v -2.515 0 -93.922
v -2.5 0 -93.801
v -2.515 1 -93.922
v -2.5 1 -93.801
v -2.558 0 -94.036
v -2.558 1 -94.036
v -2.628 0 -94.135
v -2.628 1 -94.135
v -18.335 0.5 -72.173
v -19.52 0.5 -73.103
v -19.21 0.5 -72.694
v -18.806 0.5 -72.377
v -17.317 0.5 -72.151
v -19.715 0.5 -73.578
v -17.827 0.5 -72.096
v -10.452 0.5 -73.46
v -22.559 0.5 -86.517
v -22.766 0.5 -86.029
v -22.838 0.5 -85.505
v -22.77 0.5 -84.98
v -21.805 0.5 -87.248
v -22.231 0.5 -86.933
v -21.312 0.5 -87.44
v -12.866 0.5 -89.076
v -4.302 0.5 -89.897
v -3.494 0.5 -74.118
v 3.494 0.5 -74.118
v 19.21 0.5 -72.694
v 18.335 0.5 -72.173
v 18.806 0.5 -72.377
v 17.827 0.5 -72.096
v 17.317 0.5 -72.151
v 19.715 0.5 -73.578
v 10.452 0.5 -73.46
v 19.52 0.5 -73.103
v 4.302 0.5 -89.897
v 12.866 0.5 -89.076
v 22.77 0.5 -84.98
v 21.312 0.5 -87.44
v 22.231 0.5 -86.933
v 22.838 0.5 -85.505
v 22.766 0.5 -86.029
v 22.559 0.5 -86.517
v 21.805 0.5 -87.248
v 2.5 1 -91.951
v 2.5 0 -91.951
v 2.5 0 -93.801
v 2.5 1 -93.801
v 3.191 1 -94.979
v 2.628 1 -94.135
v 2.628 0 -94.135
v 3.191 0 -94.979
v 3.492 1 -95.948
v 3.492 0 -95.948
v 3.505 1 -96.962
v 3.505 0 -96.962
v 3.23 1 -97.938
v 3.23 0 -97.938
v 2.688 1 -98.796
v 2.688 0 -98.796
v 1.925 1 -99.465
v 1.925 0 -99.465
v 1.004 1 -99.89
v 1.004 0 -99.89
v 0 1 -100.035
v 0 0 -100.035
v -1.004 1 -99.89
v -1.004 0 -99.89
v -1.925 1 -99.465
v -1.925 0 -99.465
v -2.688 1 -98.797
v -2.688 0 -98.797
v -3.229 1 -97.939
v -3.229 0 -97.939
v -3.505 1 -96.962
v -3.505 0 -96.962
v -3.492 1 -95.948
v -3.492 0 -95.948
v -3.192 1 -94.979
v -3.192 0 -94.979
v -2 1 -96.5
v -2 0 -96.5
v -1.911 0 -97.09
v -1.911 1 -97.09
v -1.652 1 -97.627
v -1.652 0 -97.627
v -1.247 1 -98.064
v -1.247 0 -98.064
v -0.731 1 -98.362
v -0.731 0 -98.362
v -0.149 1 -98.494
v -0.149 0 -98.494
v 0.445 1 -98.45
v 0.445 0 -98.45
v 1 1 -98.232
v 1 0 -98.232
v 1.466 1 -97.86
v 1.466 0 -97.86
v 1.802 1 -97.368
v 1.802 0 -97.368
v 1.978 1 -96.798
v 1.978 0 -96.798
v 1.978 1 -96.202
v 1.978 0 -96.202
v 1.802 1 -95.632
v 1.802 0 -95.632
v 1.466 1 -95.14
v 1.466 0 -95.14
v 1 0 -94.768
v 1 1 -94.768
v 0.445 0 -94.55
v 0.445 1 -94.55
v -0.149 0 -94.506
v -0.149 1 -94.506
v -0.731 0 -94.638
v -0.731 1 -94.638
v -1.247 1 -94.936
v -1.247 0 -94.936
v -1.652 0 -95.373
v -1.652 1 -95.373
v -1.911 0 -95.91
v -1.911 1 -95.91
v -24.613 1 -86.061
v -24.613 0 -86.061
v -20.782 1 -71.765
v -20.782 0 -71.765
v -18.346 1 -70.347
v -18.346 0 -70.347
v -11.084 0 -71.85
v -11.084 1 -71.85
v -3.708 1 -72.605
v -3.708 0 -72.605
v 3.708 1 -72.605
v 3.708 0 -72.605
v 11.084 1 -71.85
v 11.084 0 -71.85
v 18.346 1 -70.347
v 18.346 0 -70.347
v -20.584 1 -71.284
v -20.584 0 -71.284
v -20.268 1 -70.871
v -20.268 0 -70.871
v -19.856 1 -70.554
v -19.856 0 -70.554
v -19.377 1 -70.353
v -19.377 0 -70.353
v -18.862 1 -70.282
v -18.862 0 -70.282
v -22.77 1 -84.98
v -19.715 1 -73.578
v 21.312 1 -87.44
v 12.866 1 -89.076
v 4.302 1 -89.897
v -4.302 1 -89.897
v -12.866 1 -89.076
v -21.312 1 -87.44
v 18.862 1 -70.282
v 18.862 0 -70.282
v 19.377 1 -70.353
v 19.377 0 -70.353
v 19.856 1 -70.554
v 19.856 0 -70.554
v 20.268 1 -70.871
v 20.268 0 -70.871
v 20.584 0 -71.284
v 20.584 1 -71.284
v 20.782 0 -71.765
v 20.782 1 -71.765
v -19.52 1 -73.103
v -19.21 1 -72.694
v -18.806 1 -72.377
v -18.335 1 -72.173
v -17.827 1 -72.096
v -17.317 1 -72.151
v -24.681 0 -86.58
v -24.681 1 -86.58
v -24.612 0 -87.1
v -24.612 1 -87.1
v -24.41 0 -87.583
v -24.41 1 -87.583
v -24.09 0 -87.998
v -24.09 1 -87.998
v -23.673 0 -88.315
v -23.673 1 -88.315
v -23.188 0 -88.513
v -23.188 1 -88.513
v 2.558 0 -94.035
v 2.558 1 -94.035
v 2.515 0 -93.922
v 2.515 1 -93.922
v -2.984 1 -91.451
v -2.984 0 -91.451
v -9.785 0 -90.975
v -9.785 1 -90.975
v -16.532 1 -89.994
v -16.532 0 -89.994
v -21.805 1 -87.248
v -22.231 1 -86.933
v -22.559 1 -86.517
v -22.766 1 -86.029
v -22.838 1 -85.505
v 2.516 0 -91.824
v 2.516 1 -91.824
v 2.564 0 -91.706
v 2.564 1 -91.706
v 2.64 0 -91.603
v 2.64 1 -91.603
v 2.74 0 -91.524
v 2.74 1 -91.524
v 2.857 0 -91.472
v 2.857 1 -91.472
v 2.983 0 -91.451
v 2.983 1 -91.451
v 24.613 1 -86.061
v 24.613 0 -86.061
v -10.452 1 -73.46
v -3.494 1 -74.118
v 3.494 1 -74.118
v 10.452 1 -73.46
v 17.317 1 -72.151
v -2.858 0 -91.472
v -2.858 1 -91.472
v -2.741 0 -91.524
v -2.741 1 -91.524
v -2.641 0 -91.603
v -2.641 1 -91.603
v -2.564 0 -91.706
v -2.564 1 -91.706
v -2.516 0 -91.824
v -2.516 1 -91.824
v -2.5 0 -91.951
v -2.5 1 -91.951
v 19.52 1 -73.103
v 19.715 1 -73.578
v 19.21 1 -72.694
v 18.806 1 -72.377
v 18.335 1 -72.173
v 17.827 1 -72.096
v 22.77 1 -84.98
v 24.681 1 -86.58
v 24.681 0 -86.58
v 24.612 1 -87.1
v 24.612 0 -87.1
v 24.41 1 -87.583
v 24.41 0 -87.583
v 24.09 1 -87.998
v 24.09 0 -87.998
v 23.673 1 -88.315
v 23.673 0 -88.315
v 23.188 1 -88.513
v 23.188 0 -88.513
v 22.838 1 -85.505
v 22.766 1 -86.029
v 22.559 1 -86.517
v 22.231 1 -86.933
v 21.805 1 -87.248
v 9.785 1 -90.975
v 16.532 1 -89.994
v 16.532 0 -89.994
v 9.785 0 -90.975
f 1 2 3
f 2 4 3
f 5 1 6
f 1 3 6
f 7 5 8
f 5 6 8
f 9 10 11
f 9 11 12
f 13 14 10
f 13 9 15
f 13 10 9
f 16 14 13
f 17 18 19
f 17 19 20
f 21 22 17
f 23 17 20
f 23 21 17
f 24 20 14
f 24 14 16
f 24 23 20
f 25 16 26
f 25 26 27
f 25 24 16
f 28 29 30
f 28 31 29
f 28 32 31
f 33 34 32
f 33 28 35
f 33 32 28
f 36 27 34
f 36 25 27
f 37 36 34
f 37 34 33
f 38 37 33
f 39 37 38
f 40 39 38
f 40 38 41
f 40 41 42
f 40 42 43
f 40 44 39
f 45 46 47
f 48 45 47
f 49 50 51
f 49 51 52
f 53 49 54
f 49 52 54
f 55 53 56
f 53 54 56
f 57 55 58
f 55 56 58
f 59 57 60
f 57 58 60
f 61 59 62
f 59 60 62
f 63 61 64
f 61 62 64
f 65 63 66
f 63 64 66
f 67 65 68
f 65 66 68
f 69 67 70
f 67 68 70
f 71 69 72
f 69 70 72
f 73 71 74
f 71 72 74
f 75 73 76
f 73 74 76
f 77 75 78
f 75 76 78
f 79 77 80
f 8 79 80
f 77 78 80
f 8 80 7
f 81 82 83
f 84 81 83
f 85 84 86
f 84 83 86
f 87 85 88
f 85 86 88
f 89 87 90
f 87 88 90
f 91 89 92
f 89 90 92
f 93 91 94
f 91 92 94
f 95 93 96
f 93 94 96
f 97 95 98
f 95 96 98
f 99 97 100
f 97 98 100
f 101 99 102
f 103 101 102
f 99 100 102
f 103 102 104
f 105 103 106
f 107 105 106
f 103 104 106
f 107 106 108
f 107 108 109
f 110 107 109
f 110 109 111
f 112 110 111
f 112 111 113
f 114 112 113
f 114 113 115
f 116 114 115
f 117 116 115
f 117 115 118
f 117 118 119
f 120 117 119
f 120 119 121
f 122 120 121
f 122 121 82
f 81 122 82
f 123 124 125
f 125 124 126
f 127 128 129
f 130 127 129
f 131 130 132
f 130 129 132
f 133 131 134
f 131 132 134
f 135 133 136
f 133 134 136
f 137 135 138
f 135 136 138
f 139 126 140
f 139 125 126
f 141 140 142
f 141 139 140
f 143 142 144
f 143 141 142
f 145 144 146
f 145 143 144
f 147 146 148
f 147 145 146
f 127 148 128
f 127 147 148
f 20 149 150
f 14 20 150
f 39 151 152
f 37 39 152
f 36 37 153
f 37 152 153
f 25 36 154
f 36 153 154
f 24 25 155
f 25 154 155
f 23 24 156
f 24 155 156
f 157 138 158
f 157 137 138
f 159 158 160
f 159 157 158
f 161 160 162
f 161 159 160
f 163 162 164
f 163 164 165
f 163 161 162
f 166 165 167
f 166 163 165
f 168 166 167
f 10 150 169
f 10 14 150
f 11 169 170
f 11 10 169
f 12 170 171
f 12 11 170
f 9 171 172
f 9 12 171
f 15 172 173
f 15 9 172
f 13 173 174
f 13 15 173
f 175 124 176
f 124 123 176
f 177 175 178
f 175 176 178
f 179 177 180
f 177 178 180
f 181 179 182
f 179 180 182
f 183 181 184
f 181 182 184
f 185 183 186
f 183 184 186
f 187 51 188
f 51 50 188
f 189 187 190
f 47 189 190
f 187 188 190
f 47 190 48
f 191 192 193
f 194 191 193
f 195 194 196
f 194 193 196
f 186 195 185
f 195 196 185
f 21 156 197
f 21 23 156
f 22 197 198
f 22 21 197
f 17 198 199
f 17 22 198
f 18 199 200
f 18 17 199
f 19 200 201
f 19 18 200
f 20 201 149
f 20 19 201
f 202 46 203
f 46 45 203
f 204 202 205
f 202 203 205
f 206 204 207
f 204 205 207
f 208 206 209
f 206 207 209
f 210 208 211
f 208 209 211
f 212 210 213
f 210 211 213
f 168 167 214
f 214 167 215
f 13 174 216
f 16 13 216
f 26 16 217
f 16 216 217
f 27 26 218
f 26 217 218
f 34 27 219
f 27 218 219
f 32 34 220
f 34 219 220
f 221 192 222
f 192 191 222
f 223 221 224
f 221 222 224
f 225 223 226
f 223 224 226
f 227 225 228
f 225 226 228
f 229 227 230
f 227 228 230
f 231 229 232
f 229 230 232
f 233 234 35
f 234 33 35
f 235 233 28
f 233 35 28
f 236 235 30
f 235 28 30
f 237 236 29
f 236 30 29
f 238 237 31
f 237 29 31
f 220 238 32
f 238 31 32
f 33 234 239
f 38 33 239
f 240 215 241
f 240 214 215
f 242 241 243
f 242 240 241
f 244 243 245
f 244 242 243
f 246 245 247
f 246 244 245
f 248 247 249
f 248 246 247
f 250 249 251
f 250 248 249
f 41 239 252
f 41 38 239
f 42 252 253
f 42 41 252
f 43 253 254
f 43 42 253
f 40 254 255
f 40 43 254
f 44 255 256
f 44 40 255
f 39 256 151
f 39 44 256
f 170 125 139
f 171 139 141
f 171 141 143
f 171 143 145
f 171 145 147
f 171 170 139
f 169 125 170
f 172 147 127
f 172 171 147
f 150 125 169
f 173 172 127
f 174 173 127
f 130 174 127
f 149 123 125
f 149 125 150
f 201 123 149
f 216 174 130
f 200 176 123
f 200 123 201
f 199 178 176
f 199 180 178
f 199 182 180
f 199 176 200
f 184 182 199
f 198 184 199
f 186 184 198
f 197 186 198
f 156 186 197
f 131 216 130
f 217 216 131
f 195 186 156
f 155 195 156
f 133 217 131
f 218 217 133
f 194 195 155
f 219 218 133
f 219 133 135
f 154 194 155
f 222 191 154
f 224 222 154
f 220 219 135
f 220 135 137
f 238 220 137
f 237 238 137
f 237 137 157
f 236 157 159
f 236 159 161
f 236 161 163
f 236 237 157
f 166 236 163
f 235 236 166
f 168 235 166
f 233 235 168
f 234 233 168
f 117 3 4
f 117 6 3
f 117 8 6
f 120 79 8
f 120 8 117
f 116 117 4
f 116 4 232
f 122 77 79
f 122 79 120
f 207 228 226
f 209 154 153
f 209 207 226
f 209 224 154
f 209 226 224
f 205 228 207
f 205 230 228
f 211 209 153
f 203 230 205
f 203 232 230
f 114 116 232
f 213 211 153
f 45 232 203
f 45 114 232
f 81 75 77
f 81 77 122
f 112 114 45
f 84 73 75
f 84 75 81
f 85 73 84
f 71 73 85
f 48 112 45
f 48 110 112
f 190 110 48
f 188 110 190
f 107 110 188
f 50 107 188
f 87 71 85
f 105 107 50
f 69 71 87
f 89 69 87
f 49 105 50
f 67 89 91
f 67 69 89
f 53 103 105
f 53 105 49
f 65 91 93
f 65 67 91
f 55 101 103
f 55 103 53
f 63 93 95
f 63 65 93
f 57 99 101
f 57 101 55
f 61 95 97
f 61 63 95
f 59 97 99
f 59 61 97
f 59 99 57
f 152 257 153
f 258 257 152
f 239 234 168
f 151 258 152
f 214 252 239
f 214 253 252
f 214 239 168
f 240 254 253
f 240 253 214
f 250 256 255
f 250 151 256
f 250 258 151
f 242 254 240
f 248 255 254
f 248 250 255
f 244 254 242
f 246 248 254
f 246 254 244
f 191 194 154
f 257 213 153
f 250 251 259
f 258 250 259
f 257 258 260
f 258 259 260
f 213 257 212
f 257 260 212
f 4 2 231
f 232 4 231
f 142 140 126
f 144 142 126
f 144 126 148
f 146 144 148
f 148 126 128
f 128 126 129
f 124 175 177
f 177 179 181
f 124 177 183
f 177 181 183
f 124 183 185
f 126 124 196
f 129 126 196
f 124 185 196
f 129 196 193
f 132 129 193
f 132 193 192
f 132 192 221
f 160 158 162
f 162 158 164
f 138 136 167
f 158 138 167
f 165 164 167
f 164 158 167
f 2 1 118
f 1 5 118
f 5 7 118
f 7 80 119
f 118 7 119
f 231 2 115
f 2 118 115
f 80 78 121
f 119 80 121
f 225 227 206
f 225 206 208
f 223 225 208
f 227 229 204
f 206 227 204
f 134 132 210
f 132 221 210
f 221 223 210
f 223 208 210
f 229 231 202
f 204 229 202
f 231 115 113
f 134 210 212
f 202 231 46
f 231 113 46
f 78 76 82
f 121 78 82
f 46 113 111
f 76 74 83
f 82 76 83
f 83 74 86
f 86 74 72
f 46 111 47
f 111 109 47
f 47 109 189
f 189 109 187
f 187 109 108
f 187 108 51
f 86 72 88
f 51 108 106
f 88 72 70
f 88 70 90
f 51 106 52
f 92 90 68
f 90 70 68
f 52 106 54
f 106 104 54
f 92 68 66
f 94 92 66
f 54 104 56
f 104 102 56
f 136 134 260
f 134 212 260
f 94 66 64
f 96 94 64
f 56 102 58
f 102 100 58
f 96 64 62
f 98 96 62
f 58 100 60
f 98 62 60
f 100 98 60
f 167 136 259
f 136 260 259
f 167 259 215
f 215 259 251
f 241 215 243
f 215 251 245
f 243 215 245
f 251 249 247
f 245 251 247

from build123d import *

# Parameters (mm, degrees)
BOSS_EXTRUDE1_DEPTH   = 1
CUT_EXTRUDE2_DEPTH    = 0.5
FILLET2_R             = 2
FILLET3_R             = 0.5
F_4_0MM_DOWEL_HOLE1_D = 4


with BuildPart() as part:
    # Sketch1 → Boss-Extrude1 (new body)
    with BuildSketch(Plane(origin=(0, 0, 0), x_dir=(1, 0, 0), z_dir=(0, 1, 0))):
        with BuildLine():
            Line((-25.127648951, 87.982107603), (-20.261027783, 69.819630142))
            ThreePointArc((-20.261027783, 69.819630142), (0, 72.7), (20.261027783, 69.819630142))
            Line((20.261027783, 69.819630142), (25.127648951, 87.982107603))
            ThreePointArc((25.127648951, 87.982107603), (13.92309714, 90.434492126), (2.499766704, 91.465846995))
            Line((2.499766704, 91.465846995), (2.499766704, 94))
            ThreePointArc((2.499766704, 94), (0.000164965, 100.03536894), (-2.5, 94.000233296))
            Line((-2.5, 94.000233296), (-2.5, 91.465840618))
            ThreePointArc((-2.5, 91.465840618), (-13.923212473, 90.434474369), (-25.127648951, 87.982107603))
        make_face()
    extrude(amount=BOSS_EXTRUDE1_DEPTH)

    # Sketch2 → Cut-Extrude2 (cut)
    with BuildSketch(Plane(origin=(0, 1, 0), x_dir=(1, 0, 0), z_dir=(0, 1, 0))):
        with BuildLine():
            Line((19.204373147, 71.671696311), (23.293714059, 86.933324366))
            ThreePointArc((23.293714059, 86.933324366), (0, 90), (-23.293714059, 86.933324366))
            Line((-23.293714059, 86.933324366), (-19.204373147, 71.671696311))
            ThreePointArc((-19.204373147, 71.671696311), (0, 74.2), (19.204373147, 71.671696311))
        make_face()
    extrude(amount=-CUT_EXTRUDE2_DEPTH, mode=Mode.SUBTRACT)

    # Fillet2
    fillet2_edges = [part.edges().sort_by_distance(p)[0] for p in [
        (25.127648951, 0.5, -87.982107603),
        (20.261027783, 0.5, -69.819630142),
        (-20.261027783, 0.5, -69.819630142),
        (-25.127648951, 0.5, -87.982107603),
        (19.204373147, 0.75, -71.671696311),
        (-19.204373147, 0.75, -71.671696311),
        (-23.293714059, 0.75, -86.933324366),
        (23.293714059, 0.75, -86.933324366),
    ]]
    fillet(fillet2_edges, radius=FILLET2_R)

    # Fillet3
    fillet3_edges = [part.edges().sort_by_distance(p)[0] for p in [
        (-2.5, 0.5, -91.465840618),
        (-2.5, 0.5, -94.000233296),
        (2.499766704, 0.5, -94),
        (2.499766704, 0.5, -91.465846995),
    ]]
    fillet(fillet3_edges, radius=FILLET3_R)

    # Ø4.0mm Dowel Hole1 (through all)
    with Locations(Plane(origin=(0, 1, 0), x_dir=(1, 0, 0), z_dir=(0, 1, 0))):
        with Locations((0, 96.5)):
            Hole(F_4_0MM_DOWEL_HOLE1_D / 2)


solid = part.part
